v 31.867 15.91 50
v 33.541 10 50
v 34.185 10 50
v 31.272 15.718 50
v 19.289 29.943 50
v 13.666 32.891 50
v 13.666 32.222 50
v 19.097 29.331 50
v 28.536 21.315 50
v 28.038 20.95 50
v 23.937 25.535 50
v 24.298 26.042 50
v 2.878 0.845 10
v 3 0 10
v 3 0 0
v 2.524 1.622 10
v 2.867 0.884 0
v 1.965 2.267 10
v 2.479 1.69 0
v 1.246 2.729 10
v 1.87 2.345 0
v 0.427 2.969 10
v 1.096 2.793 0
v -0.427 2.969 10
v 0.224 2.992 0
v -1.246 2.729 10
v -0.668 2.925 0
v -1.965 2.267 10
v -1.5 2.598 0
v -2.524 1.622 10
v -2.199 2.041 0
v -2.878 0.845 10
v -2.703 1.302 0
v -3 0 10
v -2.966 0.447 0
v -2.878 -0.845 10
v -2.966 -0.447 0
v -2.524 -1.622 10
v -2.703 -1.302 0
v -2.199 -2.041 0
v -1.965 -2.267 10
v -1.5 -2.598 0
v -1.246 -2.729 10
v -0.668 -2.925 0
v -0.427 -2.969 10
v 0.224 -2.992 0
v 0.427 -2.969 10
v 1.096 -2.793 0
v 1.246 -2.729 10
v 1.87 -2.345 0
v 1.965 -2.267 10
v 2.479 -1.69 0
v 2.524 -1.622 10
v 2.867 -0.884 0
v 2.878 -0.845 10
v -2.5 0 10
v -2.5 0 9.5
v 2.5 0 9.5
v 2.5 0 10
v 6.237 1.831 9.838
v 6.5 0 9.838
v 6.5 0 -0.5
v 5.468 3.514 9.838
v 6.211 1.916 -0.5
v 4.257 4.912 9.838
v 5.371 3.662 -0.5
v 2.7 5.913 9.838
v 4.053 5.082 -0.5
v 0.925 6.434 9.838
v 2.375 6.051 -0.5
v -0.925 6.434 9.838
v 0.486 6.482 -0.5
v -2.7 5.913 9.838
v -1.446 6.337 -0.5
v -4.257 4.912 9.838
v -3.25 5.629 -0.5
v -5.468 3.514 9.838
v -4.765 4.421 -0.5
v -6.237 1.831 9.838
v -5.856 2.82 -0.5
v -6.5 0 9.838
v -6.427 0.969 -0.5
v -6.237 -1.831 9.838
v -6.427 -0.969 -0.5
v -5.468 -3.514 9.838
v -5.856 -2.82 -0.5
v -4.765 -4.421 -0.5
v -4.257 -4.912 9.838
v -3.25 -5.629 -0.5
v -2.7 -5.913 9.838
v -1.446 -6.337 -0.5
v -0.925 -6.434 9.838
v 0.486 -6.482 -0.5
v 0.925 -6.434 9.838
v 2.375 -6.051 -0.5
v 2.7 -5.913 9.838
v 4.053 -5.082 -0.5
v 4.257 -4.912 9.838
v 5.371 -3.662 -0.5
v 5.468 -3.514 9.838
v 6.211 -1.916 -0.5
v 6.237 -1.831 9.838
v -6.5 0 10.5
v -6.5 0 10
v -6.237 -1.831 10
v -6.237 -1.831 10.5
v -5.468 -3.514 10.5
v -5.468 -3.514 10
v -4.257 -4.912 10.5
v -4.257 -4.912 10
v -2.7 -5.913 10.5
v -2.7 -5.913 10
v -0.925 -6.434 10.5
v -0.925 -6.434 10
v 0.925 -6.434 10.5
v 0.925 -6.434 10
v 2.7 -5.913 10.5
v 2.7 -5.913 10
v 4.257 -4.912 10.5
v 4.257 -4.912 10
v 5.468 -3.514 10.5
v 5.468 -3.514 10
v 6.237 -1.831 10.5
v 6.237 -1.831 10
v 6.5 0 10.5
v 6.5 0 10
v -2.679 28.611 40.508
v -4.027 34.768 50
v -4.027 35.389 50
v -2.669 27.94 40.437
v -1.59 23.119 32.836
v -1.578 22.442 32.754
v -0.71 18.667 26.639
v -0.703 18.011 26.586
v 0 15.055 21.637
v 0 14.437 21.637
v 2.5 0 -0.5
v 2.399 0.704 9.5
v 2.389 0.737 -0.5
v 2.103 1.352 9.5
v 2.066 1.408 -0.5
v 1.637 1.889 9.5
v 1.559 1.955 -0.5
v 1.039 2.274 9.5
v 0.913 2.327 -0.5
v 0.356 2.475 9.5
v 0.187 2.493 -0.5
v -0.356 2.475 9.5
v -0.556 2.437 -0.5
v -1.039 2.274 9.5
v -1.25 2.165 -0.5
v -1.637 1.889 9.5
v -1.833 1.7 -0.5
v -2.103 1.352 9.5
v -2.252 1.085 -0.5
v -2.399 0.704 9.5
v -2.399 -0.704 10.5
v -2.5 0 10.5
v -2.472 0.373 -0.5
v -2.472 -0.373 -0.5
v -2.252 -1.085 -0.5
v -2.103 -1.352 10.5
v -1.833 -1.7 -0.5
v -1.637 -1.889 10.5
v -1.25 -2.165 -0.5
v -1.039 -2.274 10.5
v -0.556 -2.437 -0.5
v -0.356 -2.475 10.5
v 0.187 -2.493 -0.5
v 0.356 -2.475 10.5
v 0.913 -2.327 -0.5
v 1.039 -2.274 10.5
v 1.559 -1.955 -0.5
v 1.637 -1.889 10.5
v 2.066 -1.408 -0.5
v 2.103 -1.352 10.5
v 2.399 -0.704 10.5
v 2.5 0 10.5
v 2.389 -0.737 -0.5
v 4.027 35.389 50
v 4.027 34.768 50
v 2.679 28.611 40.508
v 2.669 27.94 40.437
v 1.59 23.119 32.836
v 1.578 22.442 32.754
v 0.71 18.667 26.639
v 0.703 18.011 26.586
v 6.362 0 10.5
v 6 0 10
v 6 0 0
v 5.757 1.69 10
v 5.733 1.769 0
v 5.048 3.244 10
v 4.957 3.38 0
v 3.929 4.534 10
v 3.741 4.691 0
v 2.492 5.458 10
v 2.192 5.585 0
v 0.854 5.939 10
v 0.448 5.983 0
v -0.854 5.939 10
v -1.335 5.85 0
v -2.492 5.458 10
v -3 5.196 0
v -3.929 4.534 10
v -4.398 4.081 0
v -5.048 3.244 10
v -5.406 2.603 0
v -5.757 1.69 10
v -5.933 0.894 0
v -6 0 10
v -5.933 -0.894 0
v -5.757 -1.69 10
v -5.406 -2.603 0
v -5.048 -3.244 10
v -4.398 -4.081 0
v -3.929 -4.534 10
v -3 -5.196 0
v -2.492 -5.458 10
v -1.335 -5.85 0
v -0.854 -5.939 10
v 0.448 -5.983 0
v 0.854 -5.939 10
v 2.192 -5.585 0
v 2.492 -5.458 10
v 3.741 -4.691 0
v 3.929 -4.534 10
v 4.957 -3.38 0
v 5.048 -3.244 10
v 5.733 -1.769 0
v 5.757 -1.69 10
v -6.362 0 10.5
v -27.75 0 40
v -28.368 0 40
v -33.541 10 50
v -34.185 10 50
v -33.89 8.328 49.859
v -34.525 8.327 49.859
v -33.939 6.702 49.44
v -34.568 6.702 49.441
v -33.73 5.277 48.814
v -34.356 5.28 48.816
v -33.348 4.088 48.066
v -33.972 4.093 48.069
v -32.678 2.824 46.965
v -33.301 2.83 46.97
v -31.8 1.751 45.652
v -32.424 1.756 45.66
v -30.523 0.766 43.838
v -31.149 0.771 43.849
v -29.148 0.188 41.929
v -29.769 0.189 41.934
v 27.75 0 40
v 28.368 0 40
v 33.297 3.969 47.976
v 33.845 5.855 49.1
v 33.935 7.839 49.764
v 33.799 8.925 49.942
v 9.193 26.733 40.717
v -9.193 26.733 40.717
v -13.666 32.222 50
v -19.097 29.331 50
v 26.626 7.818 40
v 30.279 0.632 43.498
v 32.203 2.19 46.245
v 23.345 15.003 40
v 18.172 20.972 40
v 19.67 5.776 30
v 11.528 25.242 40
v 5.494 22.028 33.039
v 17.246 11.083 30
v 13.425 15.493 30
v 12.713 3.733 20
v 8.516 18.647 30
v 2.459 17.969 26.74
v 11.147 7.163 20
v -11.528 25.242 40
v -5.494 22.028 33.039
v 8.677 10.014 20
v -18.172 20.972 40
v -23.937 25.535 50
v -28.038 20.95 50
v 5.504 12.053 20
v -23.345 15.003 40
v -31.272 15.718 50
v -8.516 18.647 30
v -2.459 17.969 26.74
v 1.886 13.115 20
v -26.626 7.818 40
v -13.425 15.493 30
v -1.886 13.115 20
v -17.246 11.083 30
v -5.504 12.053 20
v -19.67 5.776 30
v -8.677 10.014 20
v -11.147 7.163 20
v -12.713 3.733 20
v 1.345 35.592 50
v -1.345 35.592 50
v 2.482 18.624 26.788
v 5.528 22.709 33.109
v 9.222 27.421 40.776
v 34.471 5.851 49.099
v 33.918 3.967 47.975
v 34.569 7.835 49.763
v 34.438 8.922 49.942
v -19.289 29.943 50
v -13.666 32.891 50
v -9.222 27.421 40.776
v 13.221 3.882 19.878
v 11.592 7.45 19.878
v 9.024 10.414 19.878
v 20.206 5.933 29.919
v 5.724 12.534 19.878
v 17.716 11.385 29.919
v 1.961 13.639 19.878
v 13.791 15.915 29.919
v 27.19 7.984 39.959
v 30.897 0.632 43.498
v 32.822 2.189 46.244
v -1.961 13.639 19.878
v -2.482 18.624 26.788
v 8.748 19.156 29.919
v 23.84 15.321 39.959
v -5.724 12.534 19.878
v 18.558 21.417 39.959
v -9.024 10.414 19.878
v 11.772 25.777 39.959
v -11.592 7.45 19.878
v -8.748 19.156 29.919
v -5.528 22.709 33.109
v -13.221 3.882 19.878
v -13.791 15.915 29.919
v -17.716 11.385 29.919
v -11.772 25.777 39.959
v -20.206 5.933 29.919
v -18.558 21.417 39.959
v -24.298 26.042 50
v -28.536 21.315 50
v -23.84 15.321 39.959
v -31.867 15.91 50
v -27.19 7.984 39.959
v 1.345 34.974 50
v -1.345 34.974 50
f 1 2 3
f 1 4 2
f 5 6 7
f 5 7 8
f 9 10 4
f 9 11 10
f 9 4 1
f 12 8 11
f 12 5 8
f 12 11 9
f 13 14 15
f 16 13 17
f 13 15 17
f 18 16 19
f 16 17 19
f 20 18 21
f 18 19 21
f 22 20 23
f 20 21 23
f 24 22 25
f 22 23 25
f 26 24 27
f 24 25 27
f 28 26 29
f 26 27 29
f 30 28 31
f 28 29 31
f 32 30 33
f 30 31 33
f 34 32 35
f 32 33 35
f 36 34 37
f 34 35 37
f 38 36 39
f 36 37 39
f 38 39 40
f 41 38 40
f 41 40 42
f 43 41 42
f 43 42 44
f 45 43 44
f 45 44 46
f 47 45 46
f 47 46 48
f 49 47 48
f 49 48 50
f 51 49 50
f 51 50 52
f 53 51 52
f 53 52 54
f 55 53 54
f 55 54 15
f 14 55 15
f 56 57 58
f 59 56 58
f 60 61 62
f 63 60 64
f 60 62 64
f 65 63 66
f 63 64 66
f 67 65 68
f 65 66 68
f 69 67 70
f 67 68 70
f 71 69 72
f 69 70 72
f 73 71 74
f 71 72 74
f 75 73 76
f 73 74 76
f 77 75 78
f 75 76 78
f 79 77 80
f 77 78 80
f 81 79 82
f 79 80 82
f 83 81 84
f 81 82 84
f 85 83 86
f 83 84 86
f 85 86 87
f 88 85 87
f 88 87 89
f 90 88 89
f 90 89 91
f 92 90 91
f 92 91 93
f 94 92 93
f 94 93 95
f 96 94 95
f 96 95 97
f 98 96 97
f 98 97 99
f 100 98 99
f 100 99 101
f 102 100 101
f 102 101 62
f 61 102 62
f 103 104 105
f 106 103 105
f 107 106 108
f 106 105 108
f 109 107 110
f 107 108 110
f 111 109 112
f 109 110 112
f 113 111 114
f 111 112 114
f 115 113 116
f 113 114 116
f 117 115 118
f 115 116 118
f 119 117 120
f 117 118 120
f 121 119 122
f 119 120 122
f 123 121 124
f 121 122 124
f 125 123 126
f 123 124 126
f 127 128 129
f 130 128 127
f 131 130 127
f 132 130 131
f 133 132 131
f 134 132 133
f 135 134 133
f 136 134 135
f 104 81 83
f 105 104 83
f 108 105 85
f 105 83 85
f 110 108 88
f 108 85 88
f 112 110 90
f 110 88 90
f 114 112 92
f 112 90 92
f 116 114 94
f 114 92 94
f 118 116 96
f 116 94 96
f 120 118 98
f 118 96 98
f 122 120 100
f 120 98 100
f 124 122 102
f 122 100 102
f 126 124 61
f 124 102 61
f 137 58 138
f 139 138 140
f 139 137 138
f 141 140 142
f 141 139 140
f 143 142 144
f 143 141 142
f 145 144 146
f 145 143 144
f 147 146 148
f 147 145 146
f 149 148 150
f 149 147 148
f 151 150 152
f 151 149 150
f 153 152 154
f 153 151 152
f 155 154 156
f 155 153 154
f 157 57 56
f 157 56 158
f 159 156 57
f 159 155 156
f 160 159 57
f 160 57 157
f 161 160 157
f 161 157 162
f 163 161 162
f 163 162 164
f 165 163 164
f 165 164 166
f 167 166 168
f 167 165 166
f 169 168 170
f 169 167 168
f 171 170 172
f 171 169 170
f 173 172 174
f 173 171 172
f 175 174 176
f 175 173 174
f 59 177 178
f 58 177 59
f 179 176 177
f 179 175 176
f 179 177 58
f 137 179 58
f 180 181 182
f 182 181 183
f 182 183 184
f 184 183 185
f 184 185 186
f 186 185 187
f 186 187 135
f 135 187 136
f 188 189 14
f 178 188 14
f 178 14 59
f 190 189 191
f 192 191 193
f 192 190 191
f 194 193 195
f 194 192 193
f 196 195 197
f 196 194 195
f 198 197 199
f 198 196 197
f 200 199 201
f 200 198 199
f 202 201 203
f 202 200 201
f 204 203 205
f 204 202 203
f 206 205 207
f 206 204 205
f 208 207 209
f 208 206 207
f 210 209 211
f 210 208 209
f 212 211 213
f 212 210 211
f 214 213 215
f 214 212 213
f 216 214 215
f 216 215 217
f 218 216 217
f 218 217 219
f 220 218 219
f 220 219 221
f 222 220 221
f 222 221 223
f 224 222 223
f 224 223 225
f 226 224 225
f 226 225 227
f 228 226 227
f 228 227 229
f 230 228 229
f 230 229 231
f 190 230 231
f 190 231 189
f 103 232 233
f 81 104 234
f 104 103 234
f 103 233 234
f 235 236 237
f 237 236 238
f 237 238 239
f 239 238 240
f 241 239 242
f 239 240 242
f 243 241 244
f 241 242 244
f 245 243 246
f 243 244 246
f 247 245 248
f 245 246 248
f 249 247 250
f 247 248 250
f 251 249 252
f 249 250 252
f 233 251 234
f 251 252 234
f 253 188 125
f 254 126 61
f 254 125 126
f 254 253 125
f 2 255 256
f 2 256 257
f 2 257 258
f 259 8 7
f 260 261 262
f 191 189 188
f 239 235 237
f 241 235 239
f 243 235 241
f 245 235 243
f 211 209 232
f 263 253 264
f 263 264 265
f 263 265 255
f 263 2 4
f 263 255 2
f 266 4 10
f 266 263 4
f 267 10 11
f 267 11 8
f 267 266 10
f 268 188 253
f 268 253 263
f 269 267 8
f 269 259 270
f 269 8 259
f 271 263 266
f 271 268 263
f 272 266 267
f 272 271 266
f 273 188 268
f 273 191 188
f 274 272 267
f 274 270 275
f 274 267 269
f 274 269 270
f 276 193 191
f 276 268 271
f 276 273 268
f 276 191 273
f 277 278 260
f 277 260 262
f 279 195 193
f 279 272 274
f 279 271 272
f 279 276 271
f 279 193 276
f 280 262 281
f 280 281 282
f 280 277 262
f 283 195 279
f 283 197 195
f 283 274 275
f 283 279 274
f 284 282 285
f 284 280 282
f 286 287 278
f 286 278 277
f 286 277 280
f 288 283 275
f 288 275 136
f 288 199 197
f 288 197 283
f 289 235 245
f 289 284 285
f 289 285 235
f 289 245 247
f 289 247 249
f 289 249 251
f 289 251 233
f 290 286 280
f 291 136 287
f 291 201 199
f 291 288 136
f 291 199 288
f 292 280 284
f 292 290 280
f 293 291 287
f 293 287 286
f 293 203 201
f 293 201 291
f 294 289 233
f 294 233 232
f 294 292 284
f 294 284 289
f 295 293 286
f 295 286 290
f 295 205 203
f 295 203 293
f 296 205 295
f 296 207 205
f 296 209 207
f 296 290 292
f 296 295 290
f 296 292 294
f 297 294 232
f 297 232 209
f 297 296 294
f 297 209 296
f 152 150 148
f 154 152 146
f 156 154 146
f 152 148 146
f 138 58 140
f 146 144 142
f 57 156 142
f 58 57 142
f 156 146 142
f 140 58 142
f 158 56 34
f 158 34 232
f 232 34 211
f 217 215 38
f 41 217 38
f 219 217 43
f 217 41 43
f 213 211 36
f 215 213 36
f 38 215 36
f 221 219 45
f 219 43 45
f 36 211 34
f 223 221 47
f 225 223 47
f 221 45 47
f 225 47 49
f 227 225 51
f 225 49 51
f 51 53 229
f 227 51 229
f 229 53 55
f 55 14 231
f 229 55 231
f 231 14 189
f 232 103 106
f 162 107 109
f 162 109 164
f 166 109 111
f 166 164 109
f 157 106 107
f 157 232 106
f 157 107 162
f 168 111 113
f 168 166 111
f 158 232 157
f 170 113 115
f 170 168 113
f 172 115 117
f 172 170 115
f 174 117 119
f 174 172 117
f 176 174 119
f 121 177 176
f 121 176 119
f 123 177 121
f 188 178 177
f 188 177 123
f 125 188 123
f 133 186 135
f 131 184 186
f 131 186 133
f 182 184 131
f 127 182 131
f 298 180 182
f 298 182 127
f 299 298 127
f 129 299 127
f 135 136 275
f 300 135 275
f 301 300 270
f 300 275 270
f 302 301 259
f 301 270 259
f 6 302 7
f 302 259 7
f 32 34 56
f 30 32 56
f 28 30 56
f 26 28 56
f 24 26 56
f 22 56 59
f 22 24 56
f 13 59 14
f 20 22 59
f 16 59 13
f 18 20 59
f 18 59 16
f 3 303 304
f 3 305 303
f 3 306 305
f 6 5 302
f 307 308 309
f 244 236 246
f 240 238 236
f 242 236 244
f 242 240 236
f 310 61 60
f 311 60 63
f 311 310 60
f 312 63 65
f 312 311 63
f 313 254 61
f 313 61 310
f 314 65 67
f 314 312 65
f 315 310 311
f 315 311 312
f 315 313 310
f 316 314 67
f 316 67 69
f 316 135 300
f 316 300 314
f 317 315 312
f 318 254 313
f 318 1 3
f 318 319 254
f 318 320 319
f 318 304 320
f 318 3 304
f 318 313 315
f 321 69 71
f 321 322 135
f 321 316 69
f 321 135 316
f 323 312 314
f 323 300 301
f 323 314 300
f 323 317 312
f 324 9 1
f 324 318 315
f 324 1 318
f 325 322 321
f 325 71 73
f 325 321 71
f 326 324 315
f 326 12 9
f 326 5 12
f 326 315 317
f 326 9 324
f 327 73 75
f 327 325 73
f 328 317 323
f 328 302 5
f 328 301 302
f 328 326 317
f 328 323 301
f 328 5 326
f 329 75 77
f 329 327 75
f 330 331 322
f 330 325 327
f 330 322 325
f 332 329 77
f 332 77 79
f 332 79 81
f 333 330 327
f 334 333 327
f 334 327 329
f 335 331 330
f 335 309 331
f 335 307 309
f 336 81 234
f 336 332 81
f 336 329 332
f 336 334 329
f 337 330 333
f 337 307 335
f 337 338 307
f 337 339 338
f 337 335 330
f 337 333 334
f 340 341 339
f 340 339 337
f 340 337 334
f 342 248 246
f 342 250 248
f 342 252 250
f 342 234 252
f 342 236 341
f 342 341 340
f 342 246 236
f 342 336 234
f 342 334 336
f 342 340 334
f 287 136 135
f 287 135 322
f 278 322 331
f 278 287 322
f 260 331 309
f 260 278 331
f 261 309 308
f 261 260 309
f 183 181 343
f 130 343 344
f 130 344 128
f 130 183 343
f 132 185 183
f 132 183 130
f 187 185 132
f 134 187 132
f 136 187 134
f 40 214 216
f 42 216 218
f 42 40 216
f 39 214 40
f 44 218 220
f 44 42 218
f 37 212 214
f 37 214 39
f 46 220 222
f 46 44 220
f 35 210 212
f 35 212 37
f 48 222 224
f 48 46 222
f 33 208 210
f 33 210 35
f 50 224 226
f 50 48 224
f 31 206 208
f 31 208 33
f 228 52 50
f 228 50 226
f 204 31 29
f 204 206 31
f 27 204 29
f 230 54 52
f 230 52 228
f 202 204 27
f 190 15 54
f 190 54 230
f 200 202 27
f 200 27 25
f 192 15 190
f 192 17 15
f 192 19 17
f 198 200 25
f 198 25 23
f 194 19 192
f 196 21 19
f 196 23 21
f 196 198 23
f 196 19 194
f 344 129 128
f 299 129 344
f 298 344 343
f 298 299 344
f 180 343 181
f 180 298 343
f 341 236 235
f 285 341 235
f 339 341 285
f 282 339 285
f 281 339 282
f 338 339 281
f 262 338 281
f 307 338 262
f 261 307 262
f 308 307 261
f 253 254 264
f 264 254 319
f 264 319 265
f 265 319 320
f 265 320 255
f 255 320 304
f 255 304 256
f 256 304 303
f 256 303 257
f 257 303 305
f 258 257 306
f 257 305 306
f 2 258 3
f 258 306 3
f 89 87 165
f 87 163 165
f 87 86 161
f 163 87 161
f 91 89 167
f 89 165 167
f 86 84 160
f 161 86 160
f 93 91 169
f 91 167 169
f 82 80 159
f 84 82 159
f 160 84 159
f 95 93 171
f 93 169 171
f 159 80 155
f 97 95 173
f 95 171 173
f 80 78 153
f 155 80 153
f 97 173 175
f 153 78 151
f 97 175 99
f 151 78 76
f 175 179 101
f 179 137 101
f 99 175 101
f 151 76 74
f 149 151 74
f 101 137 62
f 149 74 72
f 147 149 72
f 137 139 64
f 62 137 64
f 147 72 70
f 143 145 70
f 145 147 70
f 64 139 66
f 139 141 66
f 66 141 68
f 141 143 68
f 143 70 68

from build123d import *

# Parameters (mm, degrees)
SKETCH1_R            = 6
SKETCH1_R_2          = 3
BOSS_EXTRUDE1_DEPTH  = 10
SHELL1_START         = 10
SHELL1_DEPTH         = 40
SHELL1_2_OUTLINE_R   = 6
SHELL1_2_OUTLINE_R_2 = 3
SHELL1_2_DEPTH       = 10
SHELL1_START_2       = -0.5
SHELL1_3_OUTLINE_R   = 6.5
SHELL1_3_OUTLINE_R_2 = 6
SHELL1_3_OUTLINE_R_3 = 3
SHELL1_3_OUTLINE_R_4 = 2.5
SHELL1_3_DEPTH       = 10.5
SHELL1_4_OUTLINE_R   = 6
SHELL1_4_OUTLINE_R_2 = 3
SHELL1_4_DEPTH       = 0.5
SHELL1_5_DEPTH       = 0.5
SHELL1_START_3       = 9.5
SHELL1_6_DEPTH       = 0.5
SHELL1_8_ANGLE       = 180
SHELL1_9_ANGLE       = 180
FILLET1_R            = 10
CUT_EXTRUDE3_DEPTH   = 50


with BuildPart() as part:
    # Sketch1 → Boss-Extrude1 (new body)
    with BuildSketch(Plane.XY):
        Circle(SKETCH1_R)
        Circle(SKETCH1_R_2, mode=Mode.SUBTRACT)
    extrude(amount=BOSS_EXTRUDE1_DEPTH)

    # Sketch14 → Loft1 section 0
    with BuildSketch(Plane.XY.offset(10)):
        with BuildLine():
            Line((-6, 0), (6, 0))
            ThreePointArc((6, 0), (0, 6), (-6, 0))
        make_face()
    # Sketch13 → Loft1 section 1
    with BuildSketch(Plane.XY.offset(50)):
        with BuildLine():
            Line((-35, 0), (35, 0))
            ThreePointArc((35, 0), (0, 35), (-35, 0))
        make_face()
    loft()

    # Shell1: read off the stored shape, not the designer's step
    # Shell1 outline → Shell1 (cut)
    with BuildSketch(Plane.XY.offset(SHELL1_START)):
        with BuildLine():
            ThreePointArc((6, 0), (0, 6), (-6, 0))
            Line((-6, 0), (6, 0))
        make_face()
    extrude(amount=SHELL1_DEPTH, mode=Mode.SUBTRACT)

    # Shell1 2 outline → Shell1 2 (cut)
    with BuildSketch(Plane.XY):
        Circle(SHELL1_2_OUTLINE_R)
        Circle(SHELL1_2_OUTLINE_R_2, mode=Mode.SUBTRACT)
    extrude(amount=SHELL1_2_DEPTH, mode=Mode.SUBTRACT)

    # Shell1 3 outline → Shell1 3 (add)
    # profile 1 of 2: a face of its own
    with BuildSketch(Plane.XY.offset(SHELL1_START_2)):
        Circle(SHELL1_3_OUTLINE_R)
        Circle(SHELL1_3_OUTLINE_R_2, mode=Mode.SUBTRACT)
    # profile 2 of 2: a face of its own
    with BuildSketch(Plane.XY.offset(SHELL1_START_2)):
        Circle(SHELL1_3_OUTLINE_R_3)
        Circle(SHELL1_3_OUTLINE_R_4, mode=Mode.SUBTRACT)
    extrude(amount=SHELL1_3_DEPTH)

    # Shell1 4 outline → Shell1 4 (add)
    with BuildSketch(Plane.XY.offset(SHELL1_START_2)):
        Circle(SHELL1_4_OUTLINE_R)
        Circle(SHELL1_4_OUTLINE_R_2, mode=Mode.SUBTRACT)
    extrude(amount=SHELL1_4_DEPTH)

    # Shell1 5 outline → Shell1 5 (add)
    with BuildSketch(Plane.XY.offset(SHELL1_START)):
        with BuildLine():
            ThreePointArc((-6.5, 0), (0, -6.5), (6.5, 0))
            Line((6.5, 0), (2.5, 0))
            ThreePointArc((2.5, 0), (0, -2.5), (-2.5, 0))
            Line((-2.5, 0), (-6.5, 0))
        make_face()
    extrude(amount=SHELL1_5_DEPTH)

    # Shell1 6 outline → Shell1 6 (add)
    with BuildSketch(Plane.XY.offset(SHELL1_START_3)):
        with BuildLine():
            ThreePointArc((2.5, 0), (0, 2.5), (-2.5, 0))
            Line((-2.5, 0), (2.5, 0))
        make_face()
    extrude(amount=SHELL1_6_DEPTH)

    # Shell1 7 outline → Shell1 7 (revolve, cut)
    with BuildSketch(Plane.XZ):
        Polygon((35, 49.148164185), (35, 50), (6.5, 50), (6.5, 9.837819357), align=None)
    revolve(axis=Axis((0, 0, 0), (0, 0, 1)), mode=Mode.SUBTRACT)

    # Shell1 8 outline → Shell1 8 (revolve, cut)
    with BuildSketch(Plane.XZ):
        Polygon((6, 50), (6, 10), (6.5, 10.689655172), (6.5, 50), align=None)
    revolve(axis=Axis((0, 0, 0), (0, 0, 1)), revolution_arc=SHELL1_8_ANGLE, mode=Mode.SUBTRACT)

    # Shell1 9 outline → Shell1 9 (revolve)
    with BuildSketch(Plane.XZ):
        Polygon((35.617580966, 50), (35, 50), (6, 10), (6.5, 10), (6.5, 9.837819357), align=None)
    revolve(axis=Axis((0, 0, 0), (0, 0, 1)), revolution_arc=SHELL1_9_ANGLE)

    # Fillet1
    # the kernel refuses this fillet: 10 mm, written as the material it takes off along each edge
    with BuildSketch(Plane(origin=(-60.617580966, 0, 50), x_dir=(0, 1, 0), z_dir=(1, 0, 0))) as fillet1_piece_1:
        with BuildLine():
            CenterArc((FILLET1_R, -FILLET1_R), FILLET1_R, 90, 90)
            Line((0, -FILLET1_R), (-FILLET1_R * 0.02, -FILLET1_R))
            Line((-FILLET1_R * 0.02, -FILLET1_R), (-FILLET1_R * 0.02, FILLET1_R * 0.02))
            Line((-FILLET1_R * 0.02, FILLET1_R * 0.02), (FILLET1_R, FILLET1_R * 0.02))
            Line((FILLET1_R, FILLET1_R * 0.02), (FILLET1_R, 0))
        make_face()
    extrude(amount=50.617580966, mode=Mode.SUBTRACT)
    with BuildSketch(Plane(origin=(60.617580966, 0, 50), x_dir=(0, 1, 0), z_dir=(-1, 0, 0))) as fillet1_piece_2:
        with BuildLine():
            CenterArc((FILLET1_R, FILLET1_R), FILLET1_R, 180, 90)
            Line((0, FILLET1_R), (-FILLET1_R * 0.02, FILLET1_R))
            Line((-FILLET1_R * 0.02, FILLET1_R), (-FILLET1_R * 0.02, -FILLET1_R * 0.02))
            Line((-FILLET1_R * 0.02, -FILLET1_R * 0.02), (FILLET1_R, -FILLET1_R * 0.02))
            Line((FILLET1_R, -FILLET1_R * 0.02), (FILLET1_R, 0))
        make_face()
    extrude(amount=50.617580966, mode=Mode.SUBTRACT)

    # Sketch15 → Cut-Extrude3 (cut)
    with BuildSketch(Plane(origin=(0, 0, 0), x_dir=(1, 0, 0), z_dir=(0, 1, 0))):
        Polygon((0, -21.637444993), (13.666434313, -50), (13.666434313, -54.174020003), (4.619274425, -54.174020003), align=None)
        Polygon((-4.619274425, -54.174020003), (0, -21.637444993), (-13.666434313, -50), (-13.666434313, -54.174020003), align=None)
    extrude(amount=CUT_EXTRUDE3_DEPTH, mode=Mode.SUBTRACT)


with BuildPart() as cut_extrude3_piece_1:
    # of the separate pieces the step leaves, piece 1, a body of its own (cut_extrude3_pieces)
    add(part.part.solids().sort_by_distance((6, 0, 0))[0])


with BuildPart() as cut_extrude3_piece_2:
    # of the separate pieces the step leaves, piece 2, a body of its own (cut_extrude3_pieces)
    add(part.part.solids().sort_by_distance((4.02668151, 34.767597501, 50))[0])


solid = Compound([cut_extrude3_piece_1.part, cut_extrude3_piece_2.part])
